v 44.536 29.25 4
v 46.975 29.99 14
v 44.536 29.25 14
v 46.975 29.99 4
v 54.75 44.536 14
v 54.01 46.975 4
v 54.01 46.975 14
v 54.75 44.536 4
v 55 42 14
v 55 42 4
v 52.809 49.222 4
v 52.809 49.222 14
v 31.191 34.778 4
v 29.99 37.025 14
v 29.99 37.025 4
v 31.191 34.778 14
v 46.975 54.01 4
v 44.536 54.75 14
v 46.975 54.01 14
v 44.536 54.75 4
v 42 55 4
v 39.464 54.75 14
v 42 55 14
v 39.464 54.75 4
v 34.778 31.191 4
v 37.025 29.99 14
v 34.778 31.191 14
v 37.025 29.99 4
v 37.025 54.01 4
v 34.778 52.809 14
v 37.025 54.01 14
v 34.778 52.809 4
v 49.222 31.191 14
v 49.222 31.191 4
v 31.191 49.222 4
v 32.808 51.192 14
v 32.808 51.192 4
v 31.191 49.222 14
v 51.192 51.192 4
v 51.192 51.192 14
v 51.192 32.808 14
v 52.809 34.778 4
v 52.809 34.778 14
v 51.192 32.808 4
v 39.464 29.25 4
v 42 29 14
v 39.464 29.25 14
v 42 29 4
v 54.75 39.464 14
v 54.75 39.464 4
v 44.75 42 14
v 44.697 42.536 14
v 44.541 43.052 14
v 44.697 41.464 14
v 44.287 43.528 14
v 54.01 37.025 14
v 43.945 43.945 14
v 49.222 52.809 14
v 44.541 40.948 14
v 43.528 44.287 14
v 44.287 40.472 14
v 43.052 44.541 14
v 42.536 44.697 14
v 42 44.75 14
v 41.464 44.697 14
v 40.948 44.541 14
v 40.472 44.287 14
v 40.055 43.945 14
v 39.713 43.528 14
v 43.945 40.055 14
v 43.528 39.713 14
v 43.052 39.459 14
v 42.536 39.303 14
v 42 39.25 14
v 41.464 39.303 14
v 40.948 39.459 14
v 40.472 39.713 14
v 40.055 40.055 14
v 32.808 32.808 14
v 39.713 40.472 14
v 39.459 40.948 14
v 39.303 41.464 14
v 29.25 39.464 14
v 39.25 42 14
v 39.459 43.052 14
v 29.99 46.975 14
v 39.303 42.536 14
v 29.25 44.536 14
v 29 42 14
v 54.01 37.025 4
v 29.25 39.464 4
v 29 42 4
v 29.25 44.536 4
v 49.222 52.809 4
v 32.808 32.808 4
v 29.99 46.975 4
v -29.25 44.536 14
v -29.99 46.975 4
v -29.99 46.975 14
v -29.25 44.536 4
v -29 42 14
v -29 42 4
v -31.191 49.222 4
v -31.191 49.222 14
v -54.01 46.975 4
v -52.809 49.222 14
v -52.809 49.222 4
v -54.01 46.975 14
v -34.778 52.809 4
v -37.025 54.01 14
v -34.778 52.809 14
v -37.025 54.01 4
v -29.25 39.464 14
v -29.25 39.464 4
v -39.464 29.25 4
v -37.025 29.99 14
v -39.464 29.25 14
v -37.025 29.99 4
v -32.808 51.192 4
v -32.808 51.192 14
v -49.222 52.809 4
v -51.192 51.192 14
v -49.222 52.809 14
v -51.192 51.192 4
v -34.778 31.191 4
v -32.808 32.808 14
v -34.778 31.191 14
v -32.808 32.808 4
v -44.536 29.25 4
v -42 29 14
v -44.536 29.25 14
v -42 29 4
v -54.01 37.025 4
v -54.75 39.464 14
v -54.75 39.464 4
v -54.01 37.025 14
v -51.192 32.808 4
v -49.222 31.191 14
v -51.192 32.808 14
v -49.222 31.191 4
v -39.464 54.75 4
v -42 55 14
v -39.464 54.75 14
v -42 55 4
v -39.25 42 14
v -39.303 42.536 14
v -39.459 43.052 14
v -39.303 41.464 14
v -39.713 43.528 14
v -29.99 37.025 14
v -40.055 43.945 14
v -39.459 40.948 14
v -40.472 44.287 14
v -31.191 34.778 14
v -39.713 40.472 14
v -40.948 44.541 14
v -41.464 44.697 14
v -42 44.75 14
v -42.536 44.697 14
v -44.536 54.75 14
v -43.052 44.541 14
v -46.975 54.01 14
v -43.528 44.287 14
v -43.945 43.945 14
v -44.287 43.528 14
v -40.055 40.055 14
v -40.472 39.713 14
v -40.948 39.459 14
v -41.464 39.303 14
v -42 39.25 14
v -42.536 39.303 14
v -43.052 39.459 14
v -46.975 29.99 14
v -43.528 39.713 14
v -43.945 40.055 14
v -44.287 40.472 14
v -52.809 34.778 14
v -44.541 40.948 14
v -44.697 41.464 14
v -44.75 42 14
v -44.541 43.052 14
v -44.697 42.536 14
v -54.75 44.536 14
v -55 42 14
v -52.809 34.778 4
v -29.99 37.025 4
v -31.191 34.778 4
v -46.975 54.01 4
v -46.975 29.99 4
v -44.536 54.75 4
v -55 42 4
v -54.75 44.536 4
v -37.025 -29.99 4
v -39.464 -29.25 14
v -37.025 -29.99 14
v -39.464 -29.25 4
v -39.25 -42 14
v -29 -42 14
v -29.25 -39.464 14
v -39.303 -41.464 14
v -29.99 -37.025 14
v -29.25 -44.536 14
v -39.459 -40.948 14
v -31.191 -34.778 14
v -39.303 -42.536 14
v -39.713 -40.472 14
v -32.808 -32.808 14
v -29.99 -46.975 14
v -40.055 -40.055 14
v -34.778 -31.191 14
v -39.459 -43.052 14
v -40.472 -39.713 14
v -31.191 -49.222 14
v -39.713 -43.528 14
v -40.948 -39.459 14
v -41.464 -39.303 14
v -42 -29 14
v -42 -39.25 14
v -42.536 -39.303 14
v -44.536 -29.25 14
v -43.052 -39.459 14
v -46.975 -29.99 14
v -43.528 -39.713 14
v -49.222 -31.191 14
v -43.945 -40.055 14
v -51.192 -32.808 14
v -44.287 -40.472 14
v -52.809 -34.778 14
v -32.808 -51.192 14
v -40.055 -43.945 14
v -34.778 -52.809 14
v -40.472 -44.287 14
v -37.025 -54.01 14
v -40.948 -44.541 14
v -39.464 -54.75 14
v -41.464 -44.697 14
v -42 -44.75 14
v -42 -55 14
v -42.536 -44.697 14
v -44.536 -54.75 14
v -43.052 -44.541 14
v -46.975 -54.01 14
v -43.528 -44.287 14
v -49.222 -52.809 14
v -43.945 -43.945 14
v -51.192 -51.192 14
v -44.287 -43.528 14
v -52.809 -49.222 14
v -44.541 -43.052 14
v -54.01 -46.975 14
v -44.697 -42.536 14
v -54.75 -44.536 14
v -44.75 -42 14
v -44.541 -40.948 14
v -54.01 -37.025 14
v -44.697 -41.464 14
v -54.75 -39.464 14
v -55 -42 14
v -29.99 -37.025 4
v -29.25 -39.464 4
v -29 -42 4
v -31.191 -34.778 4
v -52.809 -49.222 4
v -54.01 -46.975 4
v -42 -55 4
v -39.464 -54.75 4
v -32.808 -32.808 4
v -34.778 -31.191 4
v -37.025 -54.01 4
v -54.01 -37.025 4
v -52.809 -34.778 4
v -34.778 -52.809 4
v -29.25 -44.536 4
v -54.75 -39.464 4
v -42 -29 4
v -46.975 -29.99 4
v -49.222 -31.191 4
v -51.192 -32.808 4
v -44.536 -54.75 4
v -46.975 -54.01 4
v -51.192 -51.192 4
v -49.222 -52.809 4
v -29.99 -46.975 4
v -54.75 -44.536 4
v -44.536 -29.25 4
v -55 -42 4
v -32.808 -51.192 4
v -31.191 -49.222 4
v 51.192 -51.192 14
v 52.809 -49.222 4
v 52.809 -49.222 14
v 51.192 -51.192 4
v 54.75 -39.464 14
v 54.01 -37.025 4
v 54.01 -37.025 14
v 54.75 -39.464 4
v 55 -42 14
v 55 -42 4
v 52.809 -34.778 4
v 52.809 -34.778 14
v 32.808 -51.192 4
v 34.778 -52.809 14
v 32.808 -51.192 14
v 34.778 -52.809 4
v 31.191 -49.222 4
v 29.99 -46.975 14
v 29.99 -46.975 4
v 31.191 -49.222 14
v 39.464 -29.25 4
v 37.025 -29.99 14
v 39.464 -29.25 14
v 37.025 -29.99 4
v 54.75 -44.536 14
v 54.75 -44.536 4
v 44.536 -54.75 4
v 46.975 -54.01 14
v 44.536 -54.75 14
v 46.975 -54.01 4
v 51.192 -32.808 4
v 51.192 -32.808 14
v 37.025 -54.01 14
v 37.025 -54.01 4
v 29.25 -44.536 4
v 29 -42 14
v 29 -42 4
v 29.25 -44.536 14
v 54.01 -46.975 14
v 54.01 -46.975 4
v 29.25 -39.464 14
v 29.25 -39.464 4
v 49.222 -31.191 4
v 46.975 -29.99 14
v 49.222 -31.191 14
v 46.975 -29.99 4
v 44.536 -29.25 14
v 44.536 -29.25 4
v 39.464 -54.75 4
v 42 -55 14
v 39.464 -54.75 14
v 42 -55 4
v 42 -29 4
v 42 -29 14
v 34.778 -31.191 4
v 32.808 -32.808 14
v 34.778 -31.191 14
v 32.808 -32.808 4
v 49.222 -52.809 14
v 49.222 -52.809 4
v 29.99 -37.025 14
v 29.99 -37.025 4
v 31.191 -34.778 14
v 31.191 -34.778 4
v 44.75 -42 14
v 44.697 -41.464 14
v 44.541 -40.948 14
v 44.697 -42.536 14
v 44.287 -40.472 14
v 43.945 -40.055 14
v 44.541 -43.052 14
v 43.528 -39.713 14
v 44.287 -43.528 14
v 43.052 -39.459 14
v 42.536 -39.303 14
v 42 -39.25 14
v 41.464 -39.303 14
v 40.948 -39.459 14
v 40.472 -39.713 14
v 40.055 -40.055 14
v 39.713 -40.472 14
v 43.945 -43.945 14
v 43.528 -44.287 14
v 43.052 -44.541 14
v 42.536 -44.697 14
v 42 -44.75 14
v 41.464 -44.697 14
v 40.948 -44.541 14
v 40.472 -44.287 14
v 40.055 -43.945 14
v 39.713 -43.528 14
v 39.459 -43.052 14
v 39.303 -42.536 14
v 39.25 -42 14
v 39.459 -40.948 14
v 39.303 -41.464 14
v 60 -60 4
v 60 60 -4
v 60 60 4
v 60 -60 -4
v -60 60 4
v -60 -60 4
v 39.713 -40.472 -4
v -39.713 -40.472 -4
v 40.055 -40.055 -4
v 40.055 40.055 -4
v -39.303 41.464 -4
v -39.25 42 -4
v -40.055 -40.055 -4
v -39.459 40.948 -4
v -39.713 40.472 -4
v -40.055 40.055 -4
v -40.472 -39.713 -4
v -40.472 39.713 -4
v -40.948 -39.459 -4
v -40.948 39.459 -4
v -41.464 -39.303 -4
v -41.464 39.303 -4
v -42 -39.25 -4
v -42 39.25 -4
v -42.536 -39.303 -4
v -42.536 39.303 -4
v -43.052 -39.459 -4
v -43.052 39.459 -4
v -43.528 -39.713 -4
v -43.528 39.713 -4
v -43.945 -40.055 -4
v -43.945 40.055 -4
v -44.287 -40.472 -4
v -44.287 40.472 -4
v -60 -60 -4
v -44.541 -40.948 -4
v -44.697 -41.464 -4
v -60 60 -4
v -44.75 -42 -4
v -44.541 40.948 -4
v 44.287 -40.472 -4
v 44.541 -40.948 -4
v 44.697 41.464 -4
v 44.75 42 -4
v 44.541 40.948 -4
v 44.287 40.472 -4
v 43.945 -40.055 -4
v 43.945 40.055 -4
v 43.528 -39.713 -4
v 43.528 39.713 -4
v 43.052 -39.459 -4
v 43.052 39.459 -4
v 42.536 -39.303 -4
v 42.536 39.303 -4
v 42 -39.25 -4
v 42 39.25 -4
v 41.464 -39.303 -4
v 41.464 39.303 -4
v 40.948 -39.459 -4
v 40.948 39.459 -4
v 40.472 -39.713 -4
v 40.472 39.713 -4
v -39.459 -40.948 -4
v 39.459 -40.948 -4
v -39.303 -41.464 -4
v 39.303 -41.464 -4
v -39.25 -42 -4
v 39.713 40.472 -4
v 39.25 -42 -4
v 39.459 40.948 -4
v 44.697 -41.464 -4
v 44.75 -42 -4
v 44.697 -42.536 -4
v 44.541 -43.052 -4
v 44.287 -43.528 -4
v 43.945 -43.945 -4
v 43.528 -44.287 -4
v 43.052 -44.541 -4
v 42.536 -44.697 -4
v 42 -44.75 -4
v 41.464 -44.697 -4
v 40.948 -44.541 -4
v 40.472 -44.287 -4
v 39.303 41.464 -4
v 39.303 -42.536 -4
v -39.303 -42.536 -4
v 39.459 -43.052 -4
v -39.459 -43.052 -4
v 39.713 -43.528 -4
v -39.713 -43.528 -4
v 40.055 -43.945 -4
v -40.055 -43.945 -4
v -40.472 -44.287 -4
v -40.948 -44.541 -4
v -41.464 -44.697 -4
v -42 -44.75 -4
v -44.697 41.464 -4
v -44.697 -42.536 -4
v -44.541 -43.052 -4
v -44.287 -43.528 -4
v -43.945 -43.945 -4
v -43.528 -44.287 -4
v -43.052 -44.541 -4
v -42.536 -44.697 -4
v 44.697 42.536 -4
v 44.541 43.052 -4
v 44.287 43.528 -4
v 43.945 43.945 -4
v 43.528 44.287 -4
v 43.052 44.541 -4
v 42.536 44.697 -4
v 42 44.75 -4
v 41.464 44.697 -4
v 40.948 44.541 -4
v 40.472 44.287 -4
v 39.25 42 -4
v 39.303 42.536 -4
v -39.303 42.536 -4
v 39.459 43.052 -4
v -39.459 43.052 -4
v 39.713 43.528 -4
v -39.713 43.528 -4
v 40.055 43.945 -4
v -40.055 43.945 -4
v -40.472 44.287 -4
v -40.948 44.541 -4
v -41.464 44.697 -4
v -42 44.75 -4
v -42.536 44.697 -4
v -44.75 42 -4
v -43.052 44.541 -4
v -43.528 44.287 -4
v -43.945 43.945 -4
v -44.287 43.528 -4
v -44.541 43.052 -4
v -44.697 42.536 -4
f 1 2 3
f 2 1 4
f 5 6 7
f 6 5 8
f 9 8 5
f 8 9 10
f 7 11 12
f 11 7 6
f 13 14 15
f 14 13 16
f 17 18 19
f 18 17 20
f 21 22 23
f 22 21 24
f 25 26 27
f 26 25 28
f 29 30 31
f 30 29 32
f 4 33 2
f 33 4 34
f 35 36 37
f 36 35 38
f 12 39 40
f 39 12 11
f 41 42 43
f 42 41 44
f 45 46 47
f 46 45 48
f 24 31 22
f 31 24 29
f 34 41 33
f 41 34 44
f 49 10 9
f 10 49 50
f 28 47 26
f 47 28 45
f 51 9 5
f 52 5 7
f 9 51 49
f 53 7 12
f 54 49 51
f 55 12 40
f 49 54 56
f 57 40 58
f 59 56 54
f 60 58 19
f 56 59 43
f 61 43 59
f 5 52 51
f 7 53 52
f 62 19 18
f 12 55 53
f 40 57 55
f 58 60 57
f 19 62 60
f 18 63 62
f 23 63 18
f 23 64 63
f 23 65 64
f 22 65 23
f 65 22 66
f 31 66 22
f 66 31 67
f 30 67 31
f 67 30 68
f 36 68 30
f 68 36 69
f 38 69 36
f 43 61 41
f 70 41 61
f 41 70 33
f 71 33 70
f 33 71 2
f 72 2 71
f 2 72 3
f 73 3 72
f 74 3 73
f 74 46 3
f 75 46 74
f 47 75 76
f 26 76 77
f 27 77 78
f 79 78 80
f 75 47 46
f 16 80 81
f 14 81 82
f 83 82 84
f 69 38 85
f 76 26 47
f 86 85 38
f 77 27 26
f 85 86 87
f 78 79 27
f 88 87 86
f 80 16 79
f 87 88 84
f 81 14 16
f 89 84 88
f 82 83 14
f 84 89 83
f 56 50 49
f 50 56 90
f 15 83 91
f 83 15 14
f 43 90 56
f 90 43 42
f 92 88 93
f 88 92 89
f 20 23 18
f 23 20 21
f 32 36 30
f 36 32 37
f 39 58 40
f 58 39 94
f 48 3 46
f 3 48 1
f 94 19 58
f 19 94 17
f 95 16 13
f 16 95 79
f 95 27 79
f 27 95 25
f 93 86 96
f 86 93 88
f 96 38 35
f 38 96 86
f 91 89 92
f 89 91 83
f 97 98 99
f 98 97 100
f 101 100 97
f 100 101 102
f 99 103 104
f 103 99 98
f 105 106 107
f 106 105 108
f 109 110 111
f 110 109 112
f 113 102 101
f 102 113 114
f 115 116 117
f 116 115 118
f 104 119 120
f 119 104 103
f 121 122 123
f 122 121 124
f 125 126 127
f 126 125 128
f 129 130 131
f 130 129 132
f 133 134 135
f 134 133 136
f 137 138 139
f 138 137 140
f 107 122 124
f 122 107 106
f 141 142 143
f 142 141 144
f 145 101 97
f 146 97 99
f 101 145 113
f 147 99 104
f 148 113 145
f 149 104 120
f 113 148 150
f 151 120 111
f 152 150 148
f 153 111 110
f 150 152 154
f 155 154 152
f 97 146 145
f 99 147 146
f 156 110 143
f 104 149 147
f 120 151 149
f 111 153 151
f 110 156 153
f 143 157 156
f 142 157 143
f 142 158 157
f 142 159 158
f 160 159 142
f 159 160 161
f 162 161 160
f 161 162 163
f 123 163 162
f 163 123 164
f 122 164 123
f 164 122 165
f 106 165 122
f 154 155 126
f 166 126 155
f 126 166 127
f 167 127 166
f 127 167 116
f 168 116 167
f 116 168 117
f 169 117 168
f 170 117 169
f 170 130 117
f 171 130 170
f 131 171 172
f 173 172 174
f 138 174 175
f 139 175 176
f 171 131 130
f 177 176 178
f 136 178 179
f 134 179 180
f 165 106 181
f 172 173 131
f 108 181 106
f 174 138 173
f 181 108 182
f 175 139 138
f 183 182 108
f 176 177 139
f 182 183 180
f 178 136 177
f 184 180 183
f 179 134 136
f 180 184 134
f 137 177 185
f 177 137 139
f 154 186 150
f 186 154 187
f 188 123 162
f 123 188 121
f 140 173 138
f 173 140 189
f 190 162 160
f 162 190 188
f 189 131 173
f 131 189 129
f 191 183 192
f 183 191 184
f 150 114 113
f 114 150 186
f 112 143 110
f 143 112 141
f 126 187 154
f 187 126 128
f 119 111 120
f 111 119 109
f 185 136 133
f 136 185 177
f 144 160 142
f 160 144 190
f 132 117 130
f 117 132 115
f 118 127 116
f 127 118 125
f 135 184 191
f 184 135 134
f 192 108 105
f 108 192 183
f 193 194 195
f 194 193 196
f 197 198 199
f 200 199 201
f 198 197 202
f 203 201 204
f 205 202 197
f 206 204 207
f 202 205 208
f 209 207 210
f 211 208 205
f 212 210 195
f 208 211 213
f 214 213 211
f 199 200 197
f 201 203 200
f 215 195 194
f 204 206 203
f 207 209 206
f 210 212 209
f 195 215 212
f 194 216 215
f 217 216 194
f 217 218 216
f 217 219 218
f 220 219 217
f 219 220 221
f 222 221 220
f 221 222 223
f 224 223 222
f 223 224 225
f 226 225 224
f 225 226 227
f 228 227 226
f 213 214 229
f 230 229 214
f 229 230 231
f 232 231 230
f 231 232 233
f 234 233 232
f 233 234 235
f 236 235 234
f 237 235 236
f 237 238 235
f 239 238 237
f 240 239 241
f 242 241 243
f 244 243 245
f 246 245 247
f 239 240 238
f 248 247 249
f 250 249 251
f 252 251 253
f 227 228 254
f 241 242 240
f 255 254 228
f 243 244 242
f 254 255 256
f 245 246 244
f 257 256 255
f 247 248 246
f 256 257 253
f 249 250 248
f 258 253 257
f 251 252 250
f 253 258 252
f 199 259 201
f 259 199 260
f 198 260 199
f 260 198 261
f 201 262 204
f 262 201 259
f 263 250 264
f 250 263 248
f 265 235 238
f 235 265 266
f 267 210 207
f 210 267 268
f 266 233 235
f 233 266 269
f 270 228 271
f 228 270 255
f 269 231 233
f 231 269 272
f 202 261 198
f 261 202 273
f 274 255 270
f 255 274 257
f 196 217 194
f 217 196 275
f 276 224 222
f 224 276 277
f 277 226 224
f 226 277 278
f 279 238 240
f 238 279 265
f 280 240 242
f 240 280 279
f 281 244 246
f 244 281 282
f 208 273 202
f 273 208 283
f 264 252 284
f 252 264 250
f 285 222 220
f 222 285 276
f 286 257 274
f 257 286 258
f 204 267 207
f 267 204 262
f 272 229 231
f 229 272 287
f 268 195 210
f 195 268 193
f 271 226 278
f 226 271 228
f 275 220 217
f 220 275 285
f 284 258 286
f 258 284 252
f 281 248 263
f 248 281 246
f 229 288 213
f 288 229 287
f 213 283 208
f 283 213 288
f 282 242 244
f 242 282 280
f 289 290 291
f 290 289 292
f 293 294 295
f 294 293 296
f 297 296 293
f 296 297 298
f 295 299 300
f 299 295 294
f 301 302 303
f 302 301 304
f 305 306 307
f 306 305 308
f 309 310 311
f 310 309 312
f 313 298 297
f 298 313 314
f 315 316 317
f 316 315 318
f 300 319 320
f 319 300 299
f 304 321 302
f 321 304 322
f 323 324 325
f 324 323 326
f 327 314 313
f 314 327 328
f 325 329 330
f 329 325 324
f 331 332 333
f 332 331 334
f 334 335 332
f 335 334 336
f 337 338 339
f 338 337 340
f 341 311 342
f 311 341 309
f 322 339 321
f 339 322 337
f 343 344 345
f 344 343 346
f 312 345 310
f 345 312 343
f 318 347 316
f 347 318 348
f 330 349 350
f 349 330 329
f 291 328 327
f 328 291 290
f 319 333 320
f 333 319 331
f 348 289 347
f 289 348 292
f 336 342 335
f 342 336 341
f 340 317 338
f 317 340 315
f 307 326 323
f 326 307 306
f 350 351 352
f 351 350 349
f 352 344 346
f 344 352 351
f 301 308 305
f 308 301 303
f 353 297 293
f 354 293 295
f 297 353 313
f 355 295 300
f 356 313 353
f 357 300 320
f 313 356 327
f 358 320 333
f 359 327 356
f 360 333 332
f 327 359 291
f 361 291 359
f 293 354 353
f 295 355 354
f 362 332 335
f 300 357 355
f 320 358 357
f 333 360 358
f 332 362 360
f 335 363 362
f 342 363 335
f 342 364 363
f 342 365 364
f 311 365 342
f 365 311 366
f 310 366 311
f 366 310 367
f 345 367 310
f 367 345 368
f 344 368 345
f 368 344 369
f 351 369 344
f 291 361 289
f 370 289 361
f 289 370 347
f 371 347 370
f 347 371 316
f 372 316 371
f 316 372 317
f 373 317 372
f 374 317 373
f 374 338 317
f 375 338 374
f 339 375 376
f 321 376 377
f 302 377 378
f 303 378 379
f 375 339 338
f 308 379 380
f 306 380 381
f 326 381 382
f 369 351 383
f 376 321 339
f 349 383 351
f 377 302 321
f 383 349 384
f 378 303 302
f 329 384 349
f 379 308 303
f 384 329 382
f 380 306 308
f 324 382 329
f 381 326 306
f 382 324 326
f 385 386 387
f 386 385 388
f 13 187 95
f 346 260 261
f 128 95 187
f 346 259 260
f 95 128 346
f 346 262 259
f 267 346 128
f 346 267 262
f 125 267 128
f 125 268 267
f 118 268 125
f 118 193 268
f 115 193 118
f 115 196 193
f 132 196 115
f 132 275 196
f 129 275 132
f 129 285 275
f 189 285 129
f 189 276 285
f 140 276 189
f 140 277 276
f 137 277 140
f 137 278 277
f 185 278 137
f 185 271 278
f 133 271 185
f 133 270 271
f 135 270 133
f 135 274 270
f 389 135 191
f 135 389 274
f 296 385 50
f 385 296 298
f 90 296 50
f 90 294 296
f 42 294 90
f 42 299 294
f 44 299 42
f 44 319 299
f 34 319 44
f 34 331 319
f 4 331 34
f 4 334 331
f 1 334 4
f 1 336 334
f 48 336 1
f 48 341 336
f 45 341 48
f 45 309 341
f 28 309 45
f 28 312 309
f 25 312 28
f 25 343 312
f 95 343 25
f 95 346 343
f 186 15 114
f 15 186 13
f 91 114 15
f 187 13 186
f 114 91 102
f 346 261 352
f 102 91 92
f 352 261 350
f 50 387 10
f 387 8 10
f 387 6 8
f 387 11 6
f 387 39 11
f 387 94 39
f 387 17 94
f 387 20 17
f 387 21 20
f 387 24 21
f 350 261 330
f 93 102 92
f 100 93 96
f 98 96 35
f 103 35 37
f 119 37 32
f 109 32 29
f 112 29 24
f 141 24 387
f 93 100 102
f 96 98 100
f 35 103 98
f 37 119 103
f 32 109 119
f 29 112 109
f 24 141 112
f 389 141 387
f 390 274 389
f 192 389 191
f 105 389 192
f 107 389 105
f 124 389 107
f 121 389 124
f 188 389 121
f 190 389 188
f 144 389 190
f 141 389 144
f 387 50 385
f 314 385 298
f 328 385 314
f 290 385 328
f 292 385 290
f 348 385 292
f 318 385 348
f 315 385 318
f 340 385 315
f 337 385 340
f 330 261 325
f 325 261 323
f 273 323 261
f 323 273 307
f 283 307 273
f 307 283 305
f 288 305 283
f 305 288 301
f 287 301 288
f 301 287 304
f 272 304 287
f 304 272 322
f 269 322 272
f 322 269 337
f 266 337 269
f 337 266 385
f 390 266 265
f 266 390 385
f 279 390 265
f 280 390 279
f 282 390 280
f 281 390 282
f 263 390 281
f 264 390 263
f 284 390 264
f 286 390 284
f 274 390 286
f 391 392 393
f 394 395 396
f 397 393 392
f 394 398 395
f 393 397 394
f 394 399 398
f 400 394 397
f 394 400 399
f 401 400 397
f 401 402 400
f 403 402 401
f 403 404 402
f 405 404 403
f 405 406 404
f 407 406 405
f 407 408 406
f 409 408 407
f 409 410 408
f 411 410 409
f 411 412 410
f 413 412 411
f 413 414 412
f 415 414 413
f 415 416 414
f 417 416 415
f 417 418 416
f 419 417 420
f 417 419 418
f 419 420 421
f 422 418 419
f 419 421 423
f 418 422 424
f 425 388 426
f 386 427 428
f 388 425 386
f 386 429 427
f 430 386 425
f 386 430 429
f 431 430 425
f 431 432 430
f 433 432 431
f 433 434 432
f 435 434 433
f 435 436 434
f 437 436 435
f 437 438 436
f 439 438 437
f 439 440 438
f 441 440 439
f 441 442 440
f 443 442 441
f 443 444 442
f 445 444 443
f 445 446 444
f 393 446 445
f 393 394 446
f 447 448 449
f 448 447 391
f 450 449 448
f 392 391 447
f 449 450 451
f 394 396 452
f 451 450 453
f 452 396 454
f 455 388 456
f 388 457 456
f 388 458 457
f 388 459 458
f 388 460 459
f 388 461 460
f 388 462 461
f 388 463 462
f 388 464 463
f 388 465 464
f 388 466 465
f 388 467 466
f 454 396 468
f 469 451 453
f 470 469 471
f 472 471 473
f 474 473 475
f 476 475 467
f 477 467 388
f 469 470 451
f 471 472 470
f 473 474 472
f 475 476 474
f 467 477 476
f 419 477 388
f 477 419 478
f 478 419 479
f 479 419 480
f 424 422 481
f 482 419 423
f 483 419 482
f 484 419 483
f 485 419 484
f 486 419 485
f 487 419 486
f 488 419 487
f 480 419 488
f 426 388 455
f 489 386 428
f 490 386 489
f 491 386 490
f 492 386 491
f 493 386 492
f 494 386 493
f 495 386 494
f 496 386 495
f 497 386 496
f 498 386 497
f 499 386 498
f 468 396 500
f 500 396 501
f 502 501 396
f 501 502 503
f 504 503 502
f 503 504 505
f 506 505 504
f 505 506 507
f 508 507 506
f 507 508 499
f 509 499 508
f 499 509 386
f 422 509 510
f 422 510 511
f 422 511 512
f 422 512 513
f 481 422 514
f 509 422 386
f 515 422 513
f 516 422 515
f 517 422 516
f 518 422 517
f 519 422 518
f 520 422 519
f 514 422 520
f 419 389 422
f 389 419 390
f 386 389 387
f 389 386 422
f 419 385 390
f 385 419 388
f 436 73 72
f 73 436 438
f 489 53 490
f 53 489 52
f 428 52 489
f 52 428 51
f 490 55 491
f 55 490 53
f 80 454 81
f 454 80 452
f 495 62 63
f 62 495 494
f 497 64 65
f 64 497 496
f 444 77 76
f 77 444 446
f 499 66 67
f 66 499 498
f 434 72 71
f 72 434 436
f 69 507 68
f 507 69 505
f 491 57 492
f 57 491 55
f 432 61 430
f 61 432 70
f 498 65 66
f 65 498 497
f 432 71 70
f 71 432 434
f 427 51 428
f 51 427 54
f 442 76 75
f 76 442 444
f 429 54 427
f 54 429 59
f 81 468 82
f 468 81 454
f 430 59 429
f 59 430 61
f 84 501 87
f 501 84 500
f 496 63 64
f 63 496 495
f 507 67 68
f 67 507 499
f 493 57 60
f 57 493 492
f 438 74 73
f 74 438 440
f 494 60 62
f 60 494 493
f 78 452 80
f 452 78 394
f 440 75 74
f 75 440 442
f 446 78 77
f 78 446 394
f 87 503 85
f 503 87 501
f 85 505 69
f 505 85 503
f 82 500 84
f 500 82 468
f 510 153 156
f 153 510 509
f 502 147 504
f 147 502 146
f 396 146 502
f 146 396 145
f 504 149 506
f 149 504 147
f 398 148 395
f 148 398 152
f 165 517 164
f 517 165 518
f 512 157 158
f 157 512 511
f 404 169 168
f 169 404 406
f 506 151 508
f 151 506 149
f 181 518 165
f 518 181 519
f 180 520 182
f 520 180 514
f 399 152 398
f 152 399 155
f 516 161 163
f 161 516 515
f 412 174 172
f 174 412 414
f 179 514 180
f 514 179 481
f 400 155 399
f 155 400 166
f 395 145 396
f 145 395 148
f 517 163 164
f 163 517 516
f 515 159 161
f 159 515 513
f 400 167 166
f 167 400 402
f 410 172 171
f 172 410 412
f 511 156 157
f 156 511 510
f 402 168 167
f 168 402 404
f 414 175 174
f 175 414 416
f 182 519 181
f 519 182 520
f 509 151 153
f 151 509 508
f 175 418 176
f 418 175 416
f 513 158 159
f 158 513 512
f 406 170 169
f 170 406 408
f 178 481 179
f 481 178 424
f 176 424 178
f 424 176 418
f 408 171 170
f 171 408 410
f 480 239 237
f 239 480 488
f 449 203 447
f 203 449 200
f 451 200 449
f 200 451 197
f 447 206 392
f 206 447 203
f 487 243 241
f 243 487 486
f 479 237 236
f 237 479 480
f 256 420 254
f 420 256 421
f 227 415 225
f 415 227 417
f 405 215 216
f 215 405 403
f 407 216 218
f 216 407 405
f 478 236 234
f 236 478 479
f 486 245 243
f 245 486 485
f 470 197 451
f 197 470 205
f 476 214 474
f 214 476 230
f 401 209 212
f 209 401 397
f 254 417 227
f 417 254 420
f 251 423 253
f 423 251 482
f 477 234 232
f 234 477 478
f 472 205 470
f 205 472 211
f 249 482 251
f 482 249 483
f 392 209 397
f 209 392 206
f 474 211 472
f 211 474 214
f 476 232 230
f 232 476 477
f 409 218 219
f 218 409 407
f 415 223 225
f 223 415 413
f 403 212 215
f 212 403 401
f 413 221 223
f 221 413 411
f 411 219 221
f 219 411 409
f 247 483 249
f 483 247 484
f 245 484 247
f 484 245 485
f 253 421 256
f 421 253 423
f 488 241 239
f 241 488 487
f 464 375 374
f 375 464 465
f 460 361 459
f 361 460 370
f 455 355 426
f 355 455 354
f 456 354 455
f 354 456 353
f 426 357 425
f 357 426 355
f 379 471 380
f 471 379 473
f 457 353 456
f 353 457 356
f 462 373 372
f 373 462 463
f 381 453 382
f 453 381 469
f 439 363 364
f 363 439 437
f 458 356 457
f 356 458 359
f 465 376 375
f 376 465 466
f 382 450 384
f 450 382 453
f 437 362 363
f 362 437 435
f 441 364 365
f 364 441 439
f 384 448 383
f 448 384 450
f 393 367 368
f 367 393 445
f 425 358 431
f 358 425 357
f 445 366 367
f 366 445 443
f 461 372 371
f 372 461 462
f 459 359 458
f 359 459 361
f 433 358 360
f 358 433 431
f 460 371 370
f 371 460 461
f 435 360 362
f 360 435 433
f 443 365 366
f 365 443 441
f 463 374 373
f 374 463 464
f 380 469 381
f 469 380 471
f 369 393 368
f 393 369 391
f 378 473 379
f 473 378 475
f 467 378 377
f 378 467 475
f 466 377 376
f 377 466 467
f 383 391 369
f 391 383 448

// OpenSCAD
$fn = 32;

// ----------------------------------------------------------------------
// Anchor pads 120 x 120 x 18
// four corner bosses with anchor holes
// ----------------------------------------------------------------------

// --- parameters (mm) ---
plate = [120, 120, 8];  // base plate size (x, y, z)
pads = 4;               // boss count, one per corner
edge = 18;              // boss centre offset from the plate edge
boss_d = 26;            // boss diameter
boss_h = 10;            // boss height above the base plate
hole_d = 5.5;           // hole diameter

// --- derived feature positions (mm) ---
height = plate[2] + boss_h;      // = 18   overall height of the part
corner_x = plate[0] / 2 - edge;  // = 42   boss centre X
corner_y = plate[1] / 2 - edge;  // = 42   boss centre Y
feature_centers = [
  [corner_x, corner_y],
  [-corner_x, corner_y],
  [-corner_x, -corner_y],
  [corner_x, -corner_y]
];   // boss centres, anchor holes are drilled there

// base plate, four bosses standing on it, anchor holes all the way through
difference() {
  union() {
    cube(plate, center = true);
    for (centre = feature_centers)
      translate([centre[0], centre[1], plate[2] / 2 - 1])
        cylinder(d = boss_d, h = boss_h + 1);
  }
  for (centre = feature_centers)
    translate([centre[0], centre[1], -height])
      cylinder(d = hole_d, h = 2 * height + 2);  // through boss and plate
}
